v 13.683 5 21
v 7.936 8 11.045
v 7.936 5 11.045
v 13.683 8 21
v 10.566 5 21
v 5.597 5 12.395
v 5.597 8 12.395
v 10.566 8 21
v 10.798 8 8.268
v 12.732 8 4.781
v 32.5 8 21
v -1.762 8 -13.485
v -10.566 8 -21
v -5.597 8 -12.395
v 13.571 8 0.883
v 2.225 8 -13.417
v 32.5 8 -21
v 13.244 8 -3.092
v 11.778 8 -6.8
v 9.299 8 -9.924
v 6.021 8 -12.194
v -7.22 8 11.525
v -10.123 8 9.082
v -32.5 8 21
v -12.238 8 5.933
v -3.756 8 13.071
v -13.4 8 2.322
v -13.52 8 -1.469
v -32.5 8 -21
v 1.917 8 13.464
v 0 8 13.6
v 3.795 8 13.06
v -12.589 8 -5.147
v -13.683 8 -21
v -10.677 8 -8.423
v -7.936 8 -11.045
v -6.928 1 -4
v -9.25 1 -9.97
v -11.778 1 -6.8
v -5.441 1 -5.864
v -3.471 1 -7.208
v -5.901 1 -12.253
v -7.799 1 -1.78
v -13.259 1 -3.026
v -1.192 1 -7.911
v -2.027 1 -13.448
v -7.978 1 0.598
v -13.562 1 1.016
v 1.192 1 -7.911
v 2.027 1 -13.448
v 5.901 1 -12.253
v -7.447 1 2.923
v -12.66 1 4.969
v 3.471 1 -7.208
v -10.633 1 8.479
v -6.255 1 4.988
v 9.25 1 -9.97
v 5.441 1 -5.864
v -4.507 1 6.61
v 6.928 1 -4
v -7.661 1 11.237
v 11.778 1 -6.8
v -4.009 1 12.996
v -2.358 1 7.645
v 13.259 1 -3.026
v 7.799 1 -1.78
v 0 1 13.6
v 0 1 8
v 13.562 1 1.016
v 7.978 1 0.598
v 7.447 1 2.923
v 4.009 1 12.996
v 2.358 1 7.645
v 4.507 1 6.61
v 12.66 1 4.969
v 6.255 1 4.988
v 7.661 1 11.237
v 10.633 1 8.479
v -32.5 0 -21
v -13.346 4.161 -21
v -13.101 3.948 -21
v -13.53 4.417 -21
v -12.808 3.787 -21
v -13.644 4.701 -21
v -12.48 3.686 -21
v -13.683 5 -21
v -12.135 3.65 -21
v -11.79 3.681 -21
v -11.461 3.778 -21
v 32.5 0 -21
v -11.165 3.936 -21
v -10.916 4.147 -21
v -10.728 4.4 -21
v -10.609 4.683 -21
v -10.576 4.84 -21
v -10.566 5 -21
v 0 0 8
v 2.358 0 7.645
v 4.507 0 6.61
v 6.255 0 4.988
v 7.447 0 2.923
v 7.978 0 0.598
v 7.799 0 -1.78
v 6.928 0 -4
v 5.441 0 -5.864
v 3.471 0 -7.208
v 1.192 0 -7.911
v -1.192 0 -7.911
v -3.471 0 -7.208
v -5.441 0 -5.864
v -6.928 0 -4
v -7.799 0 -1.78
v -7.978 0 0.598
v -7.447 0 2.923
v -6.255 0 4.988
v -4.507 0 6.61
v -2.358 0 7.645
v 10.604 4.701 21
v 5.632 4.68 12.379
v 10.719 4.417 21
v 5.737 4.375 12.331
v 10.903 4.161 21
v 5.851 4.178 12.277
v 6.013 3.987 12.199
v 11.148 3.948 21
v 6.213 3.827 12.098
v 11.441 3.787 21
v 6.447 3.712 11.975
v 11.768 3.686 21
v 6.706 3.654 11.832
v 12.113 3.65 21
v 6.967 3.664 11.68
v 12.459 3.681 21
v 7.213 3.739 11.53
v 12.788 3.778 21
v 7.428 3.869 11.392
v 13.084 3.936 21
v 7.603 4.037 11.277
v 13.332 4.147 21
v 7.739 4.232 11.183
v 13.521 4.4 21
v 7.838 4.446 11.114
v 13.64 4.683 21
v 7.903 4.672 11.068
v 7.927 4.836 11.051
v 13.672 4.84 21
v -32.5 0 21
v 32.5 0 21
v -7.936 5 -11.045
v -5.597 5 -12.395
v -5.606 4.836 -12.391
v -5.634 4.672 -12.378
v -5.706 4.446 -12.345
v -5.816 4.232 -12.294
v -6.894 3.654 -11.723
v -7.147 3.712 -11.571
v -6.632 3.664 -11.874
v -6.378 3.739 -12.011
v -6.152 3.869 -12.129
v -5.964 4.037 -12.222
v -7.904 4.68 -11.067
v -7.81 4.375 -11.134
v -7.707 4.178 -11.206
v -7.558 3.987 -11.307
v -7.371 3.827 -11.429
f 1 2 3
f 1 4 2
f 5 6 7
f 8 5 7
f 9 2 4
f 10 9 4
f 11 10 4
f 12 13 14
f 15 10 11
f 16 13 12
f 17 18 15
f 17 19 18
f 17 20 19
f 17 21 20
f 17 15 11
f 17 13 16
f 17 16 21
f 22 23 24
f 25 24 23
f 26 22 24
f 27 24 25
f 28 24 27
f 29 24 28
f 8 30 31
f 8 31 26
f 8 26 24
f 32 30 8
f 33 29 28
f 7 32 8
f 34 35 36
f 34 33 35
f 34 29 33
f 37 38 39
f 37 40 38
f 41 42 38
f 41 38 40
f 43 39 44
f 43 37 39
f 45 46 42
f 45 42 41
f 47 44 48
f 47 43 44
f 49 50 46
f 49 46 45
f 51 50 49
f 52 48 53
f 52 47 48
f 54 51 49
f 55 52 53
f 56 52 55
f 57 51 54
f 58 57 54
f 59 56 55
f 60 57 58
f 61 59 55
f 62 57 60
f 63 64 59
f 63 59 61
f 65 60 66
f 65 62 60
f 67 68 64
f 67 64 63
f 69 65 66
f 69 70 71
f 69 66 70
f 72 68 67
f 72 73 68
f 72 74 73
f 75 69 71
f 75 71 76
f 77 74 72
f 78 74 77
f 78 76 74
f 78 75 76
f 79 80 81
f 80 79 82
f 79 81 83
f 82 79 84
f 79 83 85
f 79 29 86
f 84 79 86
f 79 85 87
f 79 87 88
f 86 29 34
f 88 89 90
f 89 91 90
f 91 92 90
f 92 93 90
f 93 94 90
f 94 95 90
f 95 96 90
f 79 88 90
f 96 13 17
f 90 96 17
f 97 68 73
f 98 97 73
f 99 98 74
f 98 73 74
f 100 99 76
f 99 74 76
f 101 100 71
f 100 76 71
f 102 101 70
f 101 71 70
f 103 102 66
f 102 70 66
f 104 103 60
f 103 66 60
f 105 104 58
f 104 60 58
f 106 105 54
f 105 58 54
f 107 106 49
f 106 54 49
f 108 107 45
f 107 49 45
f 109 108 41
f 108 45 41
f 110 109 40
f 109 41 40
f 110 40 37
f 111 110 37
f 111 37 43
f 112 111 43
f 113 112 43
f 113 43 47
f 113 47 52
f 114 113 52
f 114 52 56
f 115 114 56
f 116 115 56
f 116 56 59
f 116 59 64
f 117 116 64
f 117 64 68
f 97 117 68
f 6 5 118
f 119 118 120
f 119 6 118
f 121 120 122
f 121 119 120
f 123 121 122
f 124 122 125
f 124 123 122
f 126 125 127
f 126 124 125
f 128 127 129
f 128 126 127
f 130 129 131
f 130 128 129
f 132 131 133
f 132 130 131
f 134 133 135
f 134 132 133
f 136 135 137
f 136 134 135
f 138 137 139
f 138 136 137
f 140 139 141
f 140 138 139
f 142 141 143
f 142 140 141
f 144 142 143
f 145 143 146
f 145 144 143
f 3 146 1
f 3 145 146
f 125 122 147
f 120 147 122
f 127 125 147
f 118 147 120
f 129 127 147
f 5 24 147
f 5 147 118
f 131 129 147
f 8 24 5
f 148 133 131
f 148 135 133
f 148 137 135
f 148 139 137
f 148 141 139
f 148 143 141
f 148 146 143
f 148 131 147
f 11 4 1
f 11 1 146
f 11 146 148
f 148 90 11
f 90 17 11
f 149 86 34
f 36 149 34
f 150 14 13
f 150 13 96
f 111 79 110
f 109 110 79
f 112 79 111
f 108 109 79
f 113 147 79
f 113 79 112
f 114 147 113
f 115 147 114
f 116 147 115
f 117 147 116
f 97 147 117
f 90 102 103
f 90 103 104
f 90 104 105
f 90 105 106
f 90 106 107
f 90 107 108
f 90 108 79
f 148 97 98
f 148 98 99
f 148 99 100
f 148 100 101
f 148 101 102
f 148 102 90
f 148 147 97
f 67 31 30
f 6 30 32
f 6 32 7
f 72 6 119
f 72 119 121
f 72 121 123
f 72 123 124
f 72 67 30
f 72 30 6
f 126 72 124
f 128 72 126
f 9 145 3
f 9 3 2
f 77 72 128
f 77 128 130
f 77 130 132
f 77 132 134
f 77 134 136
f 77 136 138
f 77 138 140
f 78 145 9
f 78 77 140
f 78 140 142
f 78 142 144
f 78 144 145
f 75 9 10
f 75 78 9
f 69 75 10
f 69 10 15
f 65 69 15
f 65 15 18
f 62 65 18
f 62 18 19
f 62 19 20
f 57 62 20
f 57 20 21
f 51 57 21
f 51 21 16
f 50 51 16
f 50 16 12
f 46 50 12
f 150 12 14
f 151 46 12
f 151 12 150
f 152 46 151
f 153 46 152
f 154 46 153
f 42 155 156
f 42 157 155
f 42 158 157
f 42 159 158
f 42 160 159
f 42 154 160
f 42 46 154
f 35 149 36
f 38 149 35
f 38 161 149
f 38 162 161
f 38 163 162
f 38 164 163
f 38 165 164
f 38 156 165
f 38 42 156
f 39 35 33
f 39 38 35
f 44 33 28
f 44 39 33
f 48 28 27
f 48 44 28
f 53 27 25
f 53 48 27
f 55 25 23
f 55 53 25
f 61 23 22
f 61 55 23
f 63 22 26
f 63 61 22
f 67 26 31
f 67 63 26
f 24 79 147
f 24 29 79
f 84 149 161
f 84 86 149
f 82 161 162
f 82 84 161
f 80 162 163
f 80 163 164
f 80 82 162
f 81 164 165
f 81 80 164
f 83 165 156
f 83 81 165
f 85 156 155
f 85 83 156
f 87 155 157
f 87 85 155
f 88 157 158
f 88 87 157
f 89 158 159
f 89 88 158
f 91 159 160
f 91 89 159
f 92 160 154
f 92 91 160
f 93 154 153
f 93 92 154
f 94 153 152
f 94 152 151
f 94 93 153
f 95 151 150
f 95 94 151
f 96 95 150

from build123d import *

# Parameters (mm, degrees)
SCHIZZO1_R                        = 27
ESTRUSIONE_ESTRUSIONE1_DEPTH      = 1
SCHIZZO2_R                        = 8
TAGLIO_ESTRUSIONE1_DEPTH          = 39.19685851
SCHIZZO3_R                        = 27
SCHIZZO3_R_2                      = 13.6
ESTRUSIONE_ESTRUSIONE2_DEPTH      = 5
ESTRUSIONE_ESTRUSIONE3_DEPTH      = 2
ESTRUSIONE_ESTRUSIONE3_DEPTH_BACK = 1
SCHIZZO5_W                        = 65
SCHIZZO5_H                        = 42
SCHIZZO5_R                        = 13.6
TAGLIO_ESTRUSIONE2_DEPTH          = 43.547032799
TAGLIO_ESTRUSIONE2_DEPTH_BACK     = 43.547032799
SCHIZZO3D1_R                      = 1.35
TAGLIO_ESTRUSIONE3_DEPTH          = 44.869308585
TAGLIO_ESTRUSIONE3_DEPTH_BACK     = 44.869308585
SCHIZZO8_W                        = 81.46070362
SCHIZZO8_H                        = 59.010327036
SCHIZZO8_W_2                      = 65
SCHIZZO8_H_2                      = 42
TAGLIO_ESTRUSIONE5_DEPTH          = 43.676105804
SCHIZZO10_W                       = 15.529437252
SCHIZZO10_H                       = 42
ESTRUSIONE_ESTRUSIONE4_DEPTH      = 5
SCHIZZO11_W                       = 15.529437252
SCHIZZO11_H                       = 42
ESTRUSIONE_ESTRUSIONE5_DEPTH      = 5


with BuildPart() as part:
    # Schizzo1 → Estrusione-Estrusione1 (new body)
    with BuildSketch(Plane(origin=(0, 0, 0), x_dir=(1, 0, 0), z_dir=(0, 1, 0))):
        Circle(SCHIZZO1_R)
    extrude(amount=ESTRUSIONE_ESTRUSIONE1_DEPTH)

    # Schizzo2 → Taglio-Estrusione1 (cut, through all)
    with BuildSketch(Plane(origin=(0, 1, 0), x_dir=(1, 0, 0), z_dir=(0, 1, 0))):
        Circle(SCHIZZO2_R)
    extrude(amount=-TAGLIO_ESTRUSIONE1_DEPTH, mode=Mode.SUBTRACT)

    # Schizzo3 → Estrusione-Estrusione2 (add)
    with BuildSketch(Plane(origin=(0, 1, 0), x_dir=(1, 0, 0), z_dir=(0, 1, 0))):
        Circle(SCHIZZO3_R)
        Circle(SCHIZZO3_R_2, mode=Mode.SUBTRACT)
    extrude(amount=ESTRUSIONE_ESTRUSIONE2_DEPTH)

    # Schizzo5 → Estrusione-Estrusione3 (add, two sides: drawn at the far end of the back side and taken through both)
    with BuildSketch(Plane(origin=(0, 6, 0), x_dir=(1, 0, 0), z_dir=(0, 1, 0)).offset(-ESTRUSIONE_ESTRUSIONE3_DEPTH_BACK)):
        Rectangle(SCHIZZO5_W, SCHIZZO5_H)
        Circle(SCHIZZO5_R, mode=Mode.SUBTRACT)
    extrude(amount=ESTRUSIONE_ESTRUSIONE3_DEPTH + ESTRUSIONE_ESTRUSIONE3_DEPTH_BACK)

    # Schizzo3D1 → Taglio-Estrusione2 (cut, two sides: drawn at the far end of the back side and taken through both)
    with BuildSketch(Plane(origin=(0, 5, 0), x_dir=(-0.8660254037844382, 0, 0.500000000000001), z_dir=(-0.500000000000001, 0, -0.866025403784438)).offset(-TAGLIO_ESTRUSIONE2_DEPTH_BACK)):
        Circle(SCHIZZO3D1_R)
    extrude(amount=TAGLIO_ESTRUSIONE2_DEPTH + TAGLIO_ESTRUSIONE2_DEPTH_BACK, mode=Mode.SUBTRACT)

    # Schizzo3D2 → Taglio-Estrusione3 (cut, two sides: drawn at the far end of the back side and taken through both)
    with BuildSketch(Plane(origin=(1.169134295, 5, -0.675), x_dir=(-0.41149103074101084, 0.8799053976571924, 0.23757445736745078), z_dir=(-0.5000000000000011, 1.0747888534457561e-14, -0.866025403784438)).offset(-TAGLIO_ESTRUSIONE3_DEPTH_BACK)):
        Polygon((0, 0), (1.28290207, -2.375744574), (5.682429058, 0), (4.399526988, 2.375744574), align=None)
    extrude(amount=TAGLIO_ESTRUSIONE3_DEPTH + TAGLIO_ESTRUSIONE3_DEPTH_BACK, mode=Mode.SUBTRACT)

    # Schizzo8 → Taglio-Estrusione5 (cut, through all)
    with BuildSketch(Plane(origin=(0, 6, 0), x_dir=(1, 0, 0), z_dir=(0, 1, 0))):
        Rectangle(SCHIZZO8_W, SCHIZZO8_H)
        Rectangle(SCHIZZO8_W_2, SCHIZZO8_H_2, mode=Mode.SUBTRACT)
    extrude(amount=-TAGLIO_ESTRUSIONE5_DEPTH, mode=Mode.SUBTRACT)

    # Schizzo10 → Estrusione-Estrusione4 (add)
    with BuildSketch(Plane.XZ.offset(-5)):
        with Locations((-24.735281374, 0)):
            Rectangle(SCHIZZO10_W, SCHIZZO10_H)
    extrude(amount=ESTRUSIONE_ESTRUSIONE4_DEPTH)

    # Schizzo11 → Estrusione-Estrusione5 (add)
    with BuildSketch(Plane.XZ.offset(-5)):
        with Locations((24.735281374, 0)):
            Rectangle(SCHIZZO11_W, SCHIZZO11_H)
    extrude(amount=ESTRUSIONE_ESTRUSIONE5_DEPTH)


solid = part.part
